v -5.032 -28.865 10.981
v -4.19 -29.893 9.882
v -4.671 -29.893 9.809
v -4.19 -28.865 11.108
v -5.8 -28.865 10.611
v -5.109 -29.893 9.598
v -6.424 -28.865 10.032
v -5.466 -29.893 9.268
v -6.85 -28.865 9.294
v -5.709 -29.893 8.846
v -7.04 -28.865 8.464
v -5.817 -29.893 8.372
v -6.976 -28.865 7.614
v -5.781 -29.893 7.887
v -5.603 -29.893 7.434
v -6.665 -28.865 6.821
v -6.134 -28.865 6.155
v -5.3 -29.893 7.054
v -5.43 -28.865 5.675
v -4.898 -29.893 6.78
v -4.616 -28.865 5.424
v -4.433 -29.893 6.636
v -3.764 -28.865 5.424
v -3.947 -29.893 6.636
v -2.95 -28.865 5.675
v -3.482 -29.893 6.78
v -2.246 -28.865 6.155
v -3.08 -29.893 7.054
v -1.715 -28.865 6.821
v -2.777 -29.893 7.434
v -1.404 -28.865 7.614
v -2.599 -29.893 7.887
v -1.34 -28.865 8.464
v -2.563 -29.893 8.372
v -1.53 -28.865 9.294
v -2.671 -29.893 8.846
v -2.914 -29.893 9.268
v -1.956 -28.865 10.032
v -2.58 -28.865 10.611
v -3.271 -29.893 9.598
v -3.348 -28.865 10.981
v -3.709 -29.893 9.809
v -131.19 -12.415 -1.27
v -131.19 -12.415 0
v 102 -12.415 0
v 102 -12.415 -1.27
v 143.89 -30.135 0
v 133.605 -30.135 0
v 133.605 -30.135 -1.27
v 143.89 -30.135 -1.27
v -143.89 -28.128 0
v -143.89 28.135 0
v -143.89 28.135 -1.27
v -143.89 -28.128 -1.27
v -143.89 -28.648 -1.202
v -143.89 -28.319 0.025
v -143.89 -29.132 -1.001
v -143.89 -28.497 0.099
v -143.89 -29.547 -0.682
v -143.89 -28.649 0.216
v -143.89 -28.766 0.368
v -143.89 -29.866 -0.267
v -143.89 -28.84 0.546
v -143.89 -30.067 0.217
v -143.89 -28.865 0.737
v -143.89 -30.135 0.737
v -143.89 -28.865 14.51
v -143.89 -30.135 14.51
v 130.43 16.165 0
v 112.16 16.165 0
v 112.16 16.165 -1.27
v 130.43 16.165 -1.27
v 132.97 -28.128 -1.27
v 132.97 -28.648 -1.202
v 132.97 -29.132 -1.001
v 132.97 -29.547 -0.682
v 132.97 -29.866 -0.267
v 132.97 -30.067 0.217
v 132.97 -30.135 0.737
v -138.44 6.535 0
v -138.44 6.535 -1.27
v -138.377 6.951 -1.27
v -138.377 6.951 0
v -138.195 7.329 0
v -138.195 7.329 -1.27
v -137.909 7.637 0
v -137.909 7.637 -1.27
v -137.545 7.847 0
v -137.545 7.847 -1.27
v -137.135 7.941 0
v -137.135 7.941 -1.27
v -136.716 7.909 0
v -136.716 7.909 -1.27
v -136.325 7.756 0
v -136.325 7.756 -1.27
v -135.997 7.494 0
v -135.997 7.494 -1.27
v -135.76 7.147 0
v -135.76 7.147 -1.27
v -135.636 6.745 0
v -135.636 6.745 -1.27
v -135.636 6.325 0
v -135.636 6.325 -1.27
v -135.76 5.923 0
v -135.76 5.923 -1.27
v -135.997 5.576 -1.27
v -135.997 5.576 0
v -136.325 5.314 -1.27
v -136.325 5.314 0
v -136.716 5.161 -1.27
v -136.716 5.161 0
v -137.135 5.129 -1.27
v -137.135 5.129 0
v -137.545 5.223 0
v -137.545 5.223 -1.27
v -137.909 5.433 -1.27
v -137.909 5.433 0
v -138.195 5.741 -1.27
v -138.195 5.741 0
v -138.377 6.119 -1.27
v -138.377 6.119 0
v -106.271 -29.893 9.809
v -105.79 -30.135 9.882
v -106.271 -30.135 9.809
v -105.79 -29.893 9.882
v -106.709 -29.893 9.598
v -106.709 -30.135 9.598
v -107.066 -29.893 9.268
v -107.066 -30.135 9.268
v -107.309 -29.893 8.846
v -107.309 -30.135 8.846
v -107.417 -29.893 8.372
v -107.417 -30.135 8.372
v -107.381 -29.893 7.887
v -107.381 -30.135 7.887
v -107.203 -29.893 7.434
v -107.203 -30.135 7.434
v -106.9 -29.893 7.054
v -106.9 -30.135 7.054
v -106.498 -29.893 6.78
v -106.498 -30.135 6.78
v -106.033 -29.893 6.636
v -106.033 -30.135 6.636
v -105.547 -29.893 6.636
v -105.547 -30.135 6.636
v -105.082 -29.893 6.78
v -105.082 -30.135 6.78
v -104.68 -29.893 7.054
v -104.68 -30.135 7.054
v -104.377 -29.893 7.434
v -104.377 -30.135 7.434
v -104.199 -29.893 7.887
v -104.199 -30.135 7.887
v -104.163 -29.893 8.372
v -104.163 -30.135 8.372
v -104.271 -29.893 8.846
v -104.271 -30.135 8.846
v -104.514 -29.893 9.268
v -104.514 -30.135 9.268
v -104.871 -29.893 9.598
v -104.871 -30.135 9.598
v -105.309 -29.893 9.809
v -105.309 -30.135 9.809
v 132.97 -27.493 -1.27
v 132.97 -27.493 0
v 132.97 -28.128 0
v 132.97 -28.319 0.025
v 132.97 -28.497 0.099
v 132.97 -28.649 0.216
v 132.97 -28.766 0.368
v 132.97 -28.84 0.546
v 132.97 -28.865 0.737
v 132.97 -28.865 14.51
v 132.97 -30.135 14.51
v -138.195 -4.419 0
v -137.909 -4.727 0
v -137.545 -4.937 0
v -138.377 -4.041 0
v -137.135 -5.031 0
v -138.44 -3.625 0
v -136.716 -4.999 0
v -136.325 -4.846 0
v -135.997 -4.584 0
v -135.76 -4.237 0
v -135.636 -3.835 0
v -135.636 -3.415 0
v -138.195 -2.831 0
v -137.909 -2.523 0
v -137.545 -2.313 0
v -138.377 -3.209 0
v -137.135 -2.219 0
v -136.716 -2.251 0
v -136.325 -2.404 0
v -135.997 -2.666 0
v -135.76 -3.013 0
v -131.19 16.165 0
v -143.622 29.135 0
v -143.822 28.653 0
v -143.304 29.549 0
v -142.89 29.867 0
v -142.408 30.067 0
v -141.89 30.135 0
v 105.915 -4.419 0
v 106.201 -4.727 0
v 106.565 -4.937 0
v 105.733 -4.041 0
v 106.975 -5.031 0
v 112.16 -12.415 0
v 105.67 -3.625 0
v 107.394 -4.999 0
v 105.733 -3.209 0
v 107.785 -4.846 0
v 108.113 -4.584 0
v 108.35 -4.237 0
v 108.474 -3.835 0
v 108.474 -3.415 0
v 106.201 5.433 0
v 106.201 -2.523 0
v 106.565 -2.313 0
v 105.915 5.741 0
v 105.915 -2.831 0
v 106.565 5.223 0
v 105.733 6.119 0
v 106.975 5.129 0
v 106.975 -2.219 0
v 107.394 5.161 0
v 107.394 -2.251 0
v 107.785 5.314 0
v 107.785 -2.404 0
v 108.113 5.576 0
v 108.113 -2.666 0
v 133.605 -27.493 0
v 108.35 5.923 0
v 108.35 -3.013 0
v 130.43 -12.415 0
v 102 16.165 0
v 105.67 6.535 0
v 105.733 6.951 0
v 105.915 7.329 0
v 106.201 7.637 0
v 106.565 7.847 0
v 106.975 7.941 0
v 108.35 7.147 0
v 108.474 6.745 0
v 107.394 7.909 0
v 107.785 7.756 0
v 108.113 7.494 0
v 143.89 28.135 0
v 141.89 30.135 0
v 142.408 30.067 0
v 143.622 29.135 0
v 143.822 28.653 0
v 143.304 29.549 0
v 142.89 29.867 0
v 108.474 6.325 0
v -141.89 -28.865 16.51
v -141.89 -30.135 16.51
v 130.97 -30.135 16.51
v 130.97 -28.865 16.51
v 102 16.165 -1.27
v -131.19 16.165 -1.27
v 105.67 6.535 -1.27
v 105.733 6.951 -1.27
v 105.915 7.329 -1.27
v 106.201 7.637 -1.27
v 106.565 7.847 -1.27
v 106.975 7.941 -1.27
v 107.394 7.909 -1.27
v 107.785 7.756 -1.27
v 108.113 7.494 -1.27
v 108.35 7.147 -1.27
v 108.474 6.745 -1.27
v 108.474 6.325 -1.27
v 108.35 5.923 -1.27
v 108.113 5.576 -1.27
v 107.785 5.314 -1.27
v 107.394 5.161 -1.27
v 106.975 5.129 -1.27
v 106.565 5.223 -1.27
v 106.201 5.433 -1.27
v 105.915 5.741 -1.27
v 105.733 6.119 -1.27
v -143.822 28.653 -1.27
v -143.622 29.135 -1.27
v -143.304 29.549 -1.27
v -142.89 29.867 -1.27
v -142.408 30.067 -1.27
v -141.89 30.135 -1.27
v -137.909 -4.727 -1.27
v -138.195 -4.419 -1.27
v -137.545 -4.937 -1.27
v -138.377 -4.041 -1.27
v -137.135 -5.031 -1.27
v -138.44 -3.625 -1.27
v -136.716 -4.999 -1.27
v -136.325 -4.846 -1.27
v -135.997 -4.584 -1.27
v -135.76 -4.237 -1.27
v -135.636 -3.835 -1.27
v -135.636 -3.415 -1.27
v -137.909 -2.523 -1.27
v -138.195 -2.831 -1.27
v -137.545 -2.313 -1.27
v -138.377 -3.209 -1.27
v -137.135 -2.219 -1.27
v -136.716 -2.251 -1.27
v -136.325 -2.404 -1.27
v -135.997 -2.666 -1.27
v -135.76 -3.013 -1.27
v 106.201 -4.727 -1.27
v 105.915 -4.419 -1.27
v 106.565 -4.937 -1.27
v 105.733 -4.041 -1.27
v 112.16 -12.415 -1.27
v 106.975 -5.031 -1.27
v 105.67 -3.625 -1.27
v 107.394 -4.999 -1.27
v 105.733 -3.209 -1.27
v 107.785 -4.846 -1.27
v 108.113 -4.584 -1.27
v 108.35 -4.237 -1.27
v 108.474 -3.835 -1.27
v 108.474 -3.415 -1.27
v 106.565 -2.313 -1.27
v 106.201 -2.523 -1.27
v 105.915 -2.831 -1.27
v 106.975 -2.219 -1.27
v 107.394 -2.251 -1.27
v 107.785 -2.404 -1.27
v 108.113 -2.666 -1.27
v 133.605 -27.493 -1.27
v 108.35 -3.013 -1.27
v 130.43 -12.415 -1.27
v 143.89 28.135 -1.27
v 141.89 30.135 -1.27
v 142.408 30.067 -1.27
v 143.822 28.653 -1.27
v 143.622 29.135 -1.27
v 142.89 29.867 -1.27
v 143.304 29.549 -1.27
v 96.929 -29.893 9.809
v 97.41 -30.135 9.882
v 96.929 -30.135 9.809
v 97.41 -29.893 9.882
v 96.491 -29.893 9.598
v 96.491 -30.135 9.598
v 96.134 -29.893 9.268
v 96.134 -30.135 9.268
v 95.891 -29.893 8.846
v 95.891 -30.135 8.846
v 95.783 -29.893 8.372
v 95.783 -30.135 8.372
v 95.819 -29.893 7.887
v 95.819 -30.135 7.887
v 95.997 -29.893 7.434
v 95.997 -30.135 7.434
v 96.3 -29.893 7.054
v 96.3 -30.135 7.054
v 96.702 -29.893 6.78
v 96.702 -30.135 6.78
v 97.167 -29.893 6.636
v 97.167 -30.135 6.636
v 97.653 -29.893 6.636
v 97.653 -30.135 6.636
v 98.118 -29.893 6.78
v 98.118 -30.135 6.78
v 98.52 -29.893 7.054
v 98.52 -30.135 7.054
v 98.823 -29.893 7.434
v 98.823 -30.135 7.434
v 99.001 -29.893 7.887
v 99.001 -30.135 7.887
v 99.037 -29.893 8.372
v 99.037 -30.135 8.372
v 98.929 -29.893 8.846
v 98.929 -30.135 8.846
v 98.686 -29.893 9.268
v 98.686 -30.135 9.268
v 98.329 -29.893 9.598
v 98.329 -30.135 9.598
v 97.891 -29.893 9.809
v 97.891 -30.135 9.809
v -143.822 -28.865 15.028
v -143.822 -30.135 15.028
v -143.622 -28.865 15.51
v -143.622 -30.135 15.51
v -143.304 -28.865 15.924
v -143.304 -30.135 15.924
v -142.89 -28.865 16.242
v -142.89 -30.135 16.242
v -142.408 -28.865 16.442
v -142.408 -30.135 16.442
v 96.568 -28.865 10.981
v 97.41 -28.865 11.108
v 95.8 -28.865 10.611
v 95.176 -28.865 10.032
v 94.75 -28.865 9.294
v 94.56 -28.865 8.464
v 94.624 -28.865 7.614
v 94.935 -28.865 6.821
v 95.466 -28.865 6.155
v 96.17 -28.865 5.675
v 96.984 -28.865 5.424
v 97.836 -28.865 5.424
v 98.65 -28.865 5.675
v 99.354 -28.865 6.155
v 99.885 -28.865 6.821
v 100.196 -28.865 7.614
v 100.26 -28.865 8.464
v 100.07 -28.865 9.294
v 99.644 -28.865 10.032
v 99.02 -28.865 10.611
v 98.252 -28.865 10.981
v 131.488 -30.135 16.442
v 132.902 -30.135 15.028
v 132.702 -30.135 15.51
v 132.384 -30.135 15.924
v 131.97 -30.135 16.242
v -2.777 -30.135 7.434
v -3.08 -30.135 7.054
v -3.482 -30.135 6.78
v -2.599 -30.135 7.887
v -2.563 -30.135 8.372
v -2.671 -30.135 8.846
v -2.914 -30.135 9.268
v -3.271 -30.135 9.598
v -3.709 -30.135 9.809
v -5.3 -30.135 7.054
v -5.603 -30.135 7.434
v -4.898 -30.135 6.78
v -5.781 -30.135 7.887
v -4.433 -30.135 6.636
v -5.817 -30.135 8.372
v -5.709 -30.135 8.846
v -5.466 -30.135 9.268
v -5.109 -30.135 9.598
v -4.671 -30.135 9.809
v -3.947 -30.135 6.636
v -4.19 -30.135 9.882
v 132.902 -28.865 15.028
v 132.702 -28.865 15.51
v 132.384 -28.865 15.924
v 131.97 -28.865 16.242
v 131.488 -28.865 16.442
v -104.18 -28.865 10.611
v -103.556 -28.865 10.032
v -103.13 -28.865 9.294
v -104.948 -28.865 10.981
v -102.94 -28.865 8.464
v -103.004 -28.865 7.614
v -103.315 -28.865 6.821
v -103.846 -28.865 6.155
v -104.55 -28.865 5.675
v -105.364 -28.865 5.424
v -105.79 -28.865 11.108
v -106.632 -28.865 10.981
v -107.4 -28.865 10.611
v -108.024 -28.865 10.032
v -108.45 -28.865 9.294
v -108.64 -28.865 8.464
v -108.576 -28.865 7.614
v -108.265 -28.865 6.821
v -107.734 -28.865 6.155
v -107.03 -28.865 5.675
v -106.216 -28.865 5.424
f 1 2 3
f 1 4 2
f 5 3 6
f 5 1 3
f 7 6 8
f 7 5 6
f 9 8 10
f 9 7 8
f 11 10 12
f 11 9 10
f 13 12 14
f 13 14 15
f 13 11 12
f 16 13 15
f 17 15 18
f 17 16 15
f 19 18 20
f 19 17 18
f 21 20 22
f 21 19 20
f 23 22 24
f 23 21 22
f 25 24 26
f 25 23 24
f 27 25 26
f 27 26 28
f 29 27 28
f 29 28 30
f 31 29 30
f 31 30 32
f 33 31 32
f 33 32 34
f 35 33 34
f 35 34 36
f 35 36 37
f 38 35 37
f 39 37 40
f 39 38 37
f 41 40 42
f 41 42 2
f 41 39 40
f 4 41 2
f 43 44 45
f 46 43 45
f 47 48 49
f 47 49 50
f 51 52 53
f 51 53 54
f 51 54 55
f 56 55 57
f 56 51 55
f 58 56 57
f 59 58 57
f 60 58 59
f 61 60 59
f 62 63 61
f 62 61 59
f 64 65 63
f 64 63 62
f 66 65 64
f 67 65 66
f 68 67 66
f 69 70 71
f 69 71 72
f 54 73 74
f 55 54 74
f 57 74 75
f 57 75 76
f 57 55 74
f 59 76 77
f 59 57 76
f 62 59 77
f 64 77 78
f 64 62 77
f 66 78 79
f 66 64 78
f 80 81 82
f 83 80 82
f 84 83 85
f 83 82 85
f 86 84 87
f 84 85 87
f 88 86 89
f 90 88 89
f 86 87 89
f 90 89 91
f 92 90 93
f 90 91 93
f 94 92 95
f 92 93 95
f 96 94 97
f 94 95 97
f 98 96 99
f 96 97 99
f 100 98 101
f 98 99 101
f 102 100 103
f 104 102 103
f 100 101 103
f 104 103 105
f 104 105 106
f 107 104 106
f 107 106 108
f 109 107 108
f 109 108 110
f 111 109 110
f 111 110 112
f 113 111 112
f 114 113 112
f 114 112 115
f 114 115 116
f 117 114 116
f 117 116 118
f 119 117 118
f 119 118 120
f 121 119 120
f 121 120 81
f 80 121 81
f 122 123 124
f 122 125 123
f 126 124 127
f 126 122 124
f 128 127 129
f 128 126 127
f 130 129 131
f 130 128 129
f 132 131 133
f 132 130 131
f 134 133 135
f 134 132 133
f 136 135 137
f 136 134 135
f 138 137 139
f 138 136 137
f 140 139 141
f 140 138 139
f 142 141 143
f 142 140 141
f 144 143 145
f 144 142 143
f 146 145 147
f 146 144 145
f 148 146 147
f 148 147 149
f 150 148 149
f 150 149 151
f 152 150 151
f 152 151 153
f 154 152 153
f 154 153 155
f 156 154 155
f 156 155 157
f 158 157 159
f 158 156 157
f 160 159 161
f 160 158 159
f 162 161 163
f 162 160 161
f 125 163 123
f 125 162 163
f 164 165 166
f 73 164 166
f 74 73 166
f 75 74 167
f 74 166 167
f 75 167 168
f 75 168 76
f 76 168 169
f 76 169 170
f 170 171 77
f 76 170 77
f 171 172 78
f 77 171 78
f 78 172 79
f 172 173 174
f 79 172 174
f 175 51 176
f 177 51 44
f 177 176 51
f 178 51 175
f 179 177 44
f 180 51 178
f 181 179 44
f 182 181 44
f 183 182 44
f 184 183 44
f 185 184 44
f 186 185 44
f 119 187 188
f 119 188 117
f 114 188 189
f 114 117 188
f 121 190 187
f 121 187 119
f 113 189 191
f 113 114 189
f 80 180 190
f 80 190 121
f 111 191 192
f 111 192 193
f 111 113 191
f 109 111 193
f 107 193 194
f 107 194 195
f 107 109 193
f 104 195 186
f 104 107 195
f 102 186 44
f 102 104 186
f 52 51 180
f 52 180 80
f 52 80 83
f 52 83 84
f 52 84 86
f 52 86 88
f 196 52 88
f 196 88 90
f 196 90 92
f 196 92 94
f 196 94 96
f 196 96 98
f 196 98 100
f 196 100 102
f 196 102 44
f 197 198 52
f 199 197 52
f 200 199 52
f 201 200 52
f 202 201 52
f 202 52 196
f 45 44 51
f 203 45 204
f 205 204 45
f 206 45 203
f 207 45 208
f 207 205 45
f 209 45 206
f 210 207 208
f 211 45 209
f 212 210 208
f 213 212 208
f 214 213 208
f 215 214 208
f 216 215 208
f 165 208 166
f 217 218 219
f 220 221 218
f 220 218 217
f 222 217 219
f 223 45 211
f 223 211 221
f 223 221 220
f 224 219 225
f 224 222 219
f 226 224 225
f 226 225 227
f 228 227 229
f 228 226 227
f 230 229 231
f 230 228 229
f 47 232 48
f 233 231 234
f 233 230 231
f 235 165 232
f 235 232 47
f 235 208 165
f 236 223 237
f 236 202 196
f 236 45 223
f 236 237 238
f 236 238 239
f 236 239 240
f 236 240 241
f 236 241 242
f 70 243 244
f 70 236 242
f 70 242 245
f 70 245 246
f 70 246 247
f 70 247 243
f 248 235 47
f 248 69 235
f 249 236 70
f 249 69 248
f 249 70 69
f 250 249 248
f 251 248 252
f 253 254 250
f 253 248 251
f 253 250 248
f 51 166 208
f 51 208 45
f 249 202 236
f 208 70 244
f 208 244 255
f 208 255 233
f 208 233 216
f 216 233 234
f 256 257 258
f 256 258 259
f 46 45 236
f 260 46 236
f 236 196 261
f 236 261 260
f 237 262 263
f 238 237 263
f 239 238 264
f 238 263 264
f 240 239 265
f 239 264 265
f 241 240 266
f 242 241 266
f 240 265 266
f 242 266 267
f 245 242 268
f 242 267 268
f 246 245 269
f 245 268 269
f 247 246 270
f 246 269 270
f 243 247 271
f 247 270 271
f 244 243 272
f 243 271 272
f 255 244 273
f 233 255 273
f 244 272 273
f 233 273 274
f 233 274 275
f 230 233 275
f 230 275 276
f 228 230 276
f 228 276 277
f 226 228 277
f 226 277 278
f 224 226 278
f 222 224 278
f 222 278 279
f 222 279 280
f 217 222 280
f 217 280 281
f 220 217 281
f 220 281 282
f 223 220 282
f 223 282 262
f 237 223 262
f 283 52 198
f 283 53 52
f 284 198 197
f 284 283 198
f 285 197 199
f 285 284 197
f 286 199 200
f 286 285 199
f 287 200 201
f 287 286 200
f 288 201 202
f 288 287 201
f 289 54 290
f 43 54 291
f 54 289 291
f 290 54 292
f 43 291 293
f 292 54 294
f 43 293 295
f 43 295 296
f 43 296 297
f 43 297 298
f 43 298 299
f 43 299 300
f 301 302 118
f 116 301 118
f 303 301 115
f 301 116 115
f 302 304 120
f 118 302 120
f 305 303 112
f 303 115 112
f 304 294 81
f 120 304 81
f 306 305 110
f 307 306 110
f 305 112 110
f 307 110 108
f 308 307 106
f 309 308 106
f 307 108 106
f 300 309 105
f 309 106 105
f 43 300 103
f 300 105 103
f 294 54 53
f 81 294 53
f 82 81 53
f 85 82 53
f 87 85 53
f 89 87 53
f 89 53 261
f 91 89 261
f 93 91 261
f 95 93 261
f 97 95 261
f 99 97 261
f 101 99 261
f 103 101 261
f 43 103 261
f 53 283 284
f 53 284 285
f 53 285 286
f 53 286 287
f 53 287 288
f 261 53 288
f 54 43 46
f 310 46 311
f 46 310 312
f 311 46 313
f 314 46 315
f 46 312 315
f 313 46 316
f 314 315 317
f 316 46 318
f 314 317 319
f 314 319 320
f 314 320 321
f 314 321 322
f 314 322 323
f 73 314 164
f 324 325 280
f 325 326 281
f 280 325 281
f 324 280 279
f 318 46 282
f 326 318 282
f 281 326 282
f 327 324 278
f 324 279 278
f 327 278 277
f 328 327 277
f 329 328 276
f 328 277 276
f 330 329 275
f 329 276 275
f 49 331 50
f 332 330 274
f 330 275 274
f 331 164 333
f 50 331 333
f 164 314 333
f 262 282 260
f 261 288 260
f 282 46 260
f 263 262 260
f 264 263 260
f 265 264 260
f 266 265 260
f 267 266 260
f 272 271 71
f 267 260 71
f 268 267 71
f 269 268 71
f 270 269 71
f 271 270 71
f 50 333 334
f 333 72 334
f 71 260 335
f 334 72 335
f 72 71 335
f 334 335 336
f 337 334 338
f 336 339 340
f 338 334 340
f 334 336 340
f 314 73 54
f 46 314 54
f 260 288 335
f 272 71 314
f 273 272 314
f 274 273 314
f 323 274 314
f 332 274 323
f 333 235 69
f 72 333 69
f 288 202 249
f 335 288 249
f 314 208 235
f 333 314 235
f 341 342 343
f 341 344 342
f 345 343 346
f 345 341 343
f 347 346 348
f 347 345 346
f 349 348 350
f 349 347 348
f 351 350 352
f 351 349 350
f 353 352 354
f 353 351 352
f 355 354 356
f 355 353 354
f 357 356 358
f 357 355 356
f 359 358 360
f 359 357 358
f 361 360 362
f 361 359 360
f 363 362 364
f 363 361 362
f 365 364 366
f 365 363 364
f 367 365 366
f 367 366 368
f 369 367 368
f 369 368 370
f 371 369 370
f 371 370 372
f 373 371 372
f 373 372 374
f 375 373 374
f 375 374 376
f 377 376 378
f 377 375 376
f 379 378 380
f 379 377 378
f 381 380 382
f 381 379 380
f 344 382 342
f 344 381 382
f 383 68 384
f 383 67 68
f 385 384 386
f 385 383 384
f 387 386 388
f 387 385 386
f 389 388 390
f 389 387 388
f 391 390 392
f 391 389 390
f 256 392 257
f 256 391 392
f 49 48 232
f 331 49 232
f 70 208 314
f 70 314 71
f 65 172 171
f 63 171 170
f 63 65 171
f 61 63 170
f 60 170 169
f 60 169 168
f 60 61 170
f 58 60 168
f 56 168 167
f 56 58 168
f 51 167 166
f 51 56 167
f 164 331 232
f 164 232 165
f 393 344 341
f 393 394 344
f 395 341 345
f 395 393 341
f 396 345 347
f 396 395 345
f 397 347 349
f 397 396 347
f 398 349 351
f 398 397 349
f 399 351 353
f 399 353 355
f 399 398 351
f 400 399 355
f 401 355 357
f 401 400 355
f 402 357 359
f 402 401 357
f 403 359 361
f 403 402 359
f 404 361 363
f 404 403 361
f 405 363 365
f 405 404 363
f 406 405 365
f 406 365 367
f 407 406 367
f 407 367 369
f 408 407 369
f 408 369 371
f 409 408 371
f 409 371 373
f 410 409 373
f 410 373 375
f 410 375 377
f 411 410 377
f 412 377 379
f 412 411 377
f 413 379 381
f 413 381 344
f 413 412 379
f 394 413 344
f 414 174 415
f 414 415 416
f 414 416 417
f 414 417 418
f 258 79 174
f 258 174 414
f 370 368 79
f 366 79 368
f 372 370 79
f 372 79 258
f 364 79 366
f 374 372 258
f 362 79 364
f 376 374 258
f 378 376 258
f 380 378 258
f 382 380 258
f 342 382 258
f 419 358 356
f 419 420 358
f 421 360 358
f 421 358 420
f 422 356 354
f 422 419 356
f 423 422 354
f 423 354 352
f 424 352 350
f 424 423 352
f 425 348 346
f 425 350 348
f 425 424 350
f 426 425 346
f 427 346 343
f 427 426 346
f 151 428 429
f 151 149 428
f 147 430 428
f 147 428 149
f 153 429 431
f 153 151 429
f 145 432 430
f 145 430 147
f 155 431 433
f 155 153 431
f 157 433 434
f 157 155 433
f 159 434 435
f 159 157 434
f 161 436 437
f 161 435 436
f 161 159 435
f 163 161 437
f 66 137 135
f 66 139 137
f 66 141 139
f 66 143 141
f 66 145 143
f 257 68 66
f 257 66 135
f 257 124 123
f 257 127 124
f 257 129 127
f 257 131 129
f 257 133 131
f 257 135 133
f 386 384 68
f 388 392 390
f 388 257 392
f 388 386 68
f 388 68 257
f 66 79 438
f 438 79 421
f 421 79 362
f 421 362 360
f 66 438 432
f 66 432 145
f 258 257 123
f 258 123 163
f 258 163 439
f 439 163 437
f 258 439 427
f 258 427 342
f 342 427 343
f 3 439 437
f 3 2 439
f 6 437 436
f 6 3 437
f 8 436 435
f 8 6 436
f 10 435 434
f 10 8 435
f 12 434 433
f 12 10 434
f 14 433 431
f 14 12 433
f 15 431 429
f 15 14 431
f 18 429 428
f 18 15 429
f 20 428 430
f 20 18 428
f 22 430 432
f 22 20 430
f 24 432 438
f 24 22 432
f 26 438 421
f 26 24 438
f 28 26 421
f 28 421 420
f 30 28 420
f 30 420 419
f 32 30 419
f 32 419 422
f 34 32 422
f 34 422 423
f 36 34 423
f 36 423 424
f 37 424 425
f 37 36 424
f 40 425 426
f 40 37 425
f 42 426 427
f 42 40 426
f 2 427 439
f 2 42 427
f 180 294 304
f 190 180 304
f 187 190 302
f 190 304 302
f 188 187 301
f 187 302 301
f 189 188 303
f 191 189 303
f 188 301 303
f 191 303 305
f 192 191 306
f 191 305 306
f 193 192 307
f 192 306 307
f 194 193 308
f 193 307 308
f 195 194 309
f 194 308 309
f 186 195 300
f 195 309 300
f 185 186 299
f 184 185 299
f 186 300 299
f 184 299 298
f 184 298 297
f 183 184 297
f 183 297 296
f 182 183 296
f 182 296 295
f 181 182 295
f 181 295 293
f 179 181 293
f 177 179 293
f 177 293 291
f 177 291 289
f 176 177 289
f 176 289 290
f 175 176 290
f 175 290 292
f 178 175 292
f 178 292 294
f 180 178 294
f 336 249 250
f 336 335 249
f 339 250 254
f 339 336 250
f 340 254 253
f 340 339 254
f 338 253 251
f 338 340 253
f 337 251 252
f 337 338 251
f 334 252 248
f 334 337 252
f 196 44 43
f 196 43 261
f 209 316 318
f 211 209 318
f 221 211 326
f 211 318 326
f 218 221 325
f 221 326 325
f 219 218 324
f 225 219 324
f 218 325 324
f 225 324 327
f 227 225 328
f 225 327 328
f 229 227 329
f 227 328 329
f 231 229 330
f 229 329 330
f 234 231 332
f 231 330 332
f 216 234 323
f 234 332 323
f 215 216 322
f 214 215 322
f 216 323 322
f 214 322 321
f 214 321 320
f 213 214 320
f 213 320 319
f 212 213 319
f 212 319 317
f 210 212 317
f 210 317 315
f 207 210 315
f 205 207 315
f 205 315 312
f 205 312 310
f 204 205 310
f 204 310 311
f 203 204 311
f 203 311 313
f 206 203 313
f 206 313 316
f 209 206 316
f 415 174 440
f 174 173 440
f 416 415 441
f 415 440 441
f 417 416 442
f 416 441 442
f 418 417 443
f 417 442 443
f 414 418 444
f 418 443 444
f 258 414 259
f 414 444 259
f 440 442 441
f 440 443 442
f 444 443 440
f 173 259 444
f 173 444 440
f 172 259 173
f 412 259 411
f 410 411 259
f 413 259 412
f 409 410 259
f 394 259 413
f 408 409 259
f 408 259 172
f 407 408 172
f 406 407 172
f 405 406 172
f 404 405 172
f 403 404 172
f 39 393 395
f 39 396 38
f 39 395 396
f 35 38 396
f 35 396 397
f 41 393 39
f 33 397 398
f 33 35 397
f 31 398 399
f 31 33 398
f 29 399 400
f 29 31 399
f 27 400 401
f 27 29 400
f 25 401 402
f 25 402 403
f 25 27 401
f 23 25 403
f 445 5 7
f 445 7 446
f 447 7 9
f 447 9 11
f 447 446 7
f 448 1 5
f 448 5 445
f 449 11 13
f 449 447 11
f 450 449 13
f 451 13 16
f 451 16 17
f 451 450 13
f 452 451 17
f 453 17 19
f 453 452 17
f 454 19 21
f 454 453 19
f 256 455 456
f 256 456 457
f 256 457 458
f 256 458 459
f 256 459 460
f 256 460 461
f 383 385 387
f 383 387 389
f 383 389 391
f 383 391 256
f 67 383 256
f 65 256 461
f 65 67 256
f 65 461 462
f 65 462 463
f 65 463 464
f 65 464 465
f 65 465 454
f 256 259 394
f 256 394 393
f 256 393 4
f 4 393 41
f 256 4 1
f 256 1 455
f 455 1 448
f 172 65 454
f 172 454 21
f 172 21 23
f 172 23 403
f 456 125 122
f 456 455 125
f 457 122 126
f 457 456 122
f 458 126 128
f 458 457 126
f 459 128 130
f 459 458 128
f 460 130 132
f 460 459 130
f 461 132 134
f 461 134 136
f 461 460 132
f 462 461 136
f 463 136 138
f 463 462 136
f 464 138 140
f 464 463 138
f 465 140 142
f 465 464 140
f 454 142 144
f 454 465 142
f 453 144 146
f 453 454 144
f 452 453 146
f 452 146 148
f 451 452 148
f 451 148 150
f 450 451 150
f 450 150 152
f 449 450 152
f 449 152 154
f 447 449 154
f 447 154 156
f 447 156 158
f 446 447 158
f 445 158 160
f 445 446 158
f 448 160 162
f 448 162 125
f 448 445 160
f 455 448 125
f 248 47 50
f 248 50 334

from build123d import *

# Parameters (mm, degrees)
SKETCH2_W                     = 287.78
SKETCH2_H                     = 60.27
SKETCH2_W_2                   = 233.19
SKETCH2_H_2                   = 28.58
SKETCH2_W_3                   = 18.27
BASE_FLANGE1_DEPTH            = 1.27
EDGE_FLANGE1_STRIP_W          = 6.5532
EDGE_FLANGE1_STRIP_H          = 1.27
EDGE_FLANGE1_STRIP_CUT_DEPTH  = 276.86
EDGE_FLANGE1_RELIEF_W         = 7.1882
EDGE_FLANGE1_RELIEF_H         = 0.635
EDGE_FLANGE1_RELIEF_CUT_DEPTH = 1.27
EDGE_FLANGE1_DEPTH            = 276.86
F_34_0_111_DIAMETER_HOLE1_D   = 2.8194
LPATTERN1_COUNT               = 3
LPATTERN1_PITCH               = 101.6
FILLET1_R                     = 2


# Sheet-metal steps are written as plain solids
with BuildPart() as part:
    # Sketch2 → Base-Flange1 (new body)
    with BuildSketch(Plane.XY):
        Rectangle(SKETCH2_W, SKETCH2_H)
        with Locations((-14.595, 1.875)):
            Rectangle(SKETCH2_W_2, SKETCH2_H_2, mode=Mode.SUBTRACT)
        with Locations((121.295, 1.875)):
            Rectangle(SKETCH2_W_3, SKETCH2_H_2, mode=Mode.SUBTRACT)
    extrude(amount=-BASE_FLANGE1_DEPTH)

    # Edge-Flange1 strip (across the edge) → Edge-Flange1 strip cut (cut)
    with BuildSketch(Plane(origin=(-143.89, -30.135, 0), x_dir=(0, 1, 0), z_dir=(1, 0, 0))):
        with Locations((-1.27, -0.635)):
            Rectangle(EDGE_FLANGE1_STRIP_W, EDGE_FLANGE1_STRIP_H)
    extrude(amount=EDGE_FLANGE1_STRIP_CUT_DEPTH, mode=Mode.SUBTRACT)

    # Edge-Flange1 relief (on the sheet) → Edge-Flange1 relief cut (cut)
    with BuildSketch(Plane(origin=(-143.89, -28.1284, 0), x_dir=(0, 1, 0), z_dir=(0, 0, 1))):
        with Locations((-2.9591, -277.1775)):
            Rectangle(EDGE_FLANGE1_RELIEF_W, EDGE_FLANGE1_RELIEF_H)
    extrude(amount=-EDGE_FLANGE1_RELIEF_CUT_DEPTH, mode=Mode.SUBTRACT)

    # Edge-Flange1 section (across the edge) → Edge-Flange1 (add)
    with BuildSketch(Plane(origin=(-143.89, -30.135, 0), x_dir=(0, 1, 0), z_dir=(1, 0, 0))):
        with BuildLine():
            Line((0, 0.7366), (0, 16.51))
            Line((0, 16.51), (1.27, 16.51))
            Line((1.27, 16.51), (1.27, 0.7366))
            ThreePointArc((1.27, 0.7366), (1.485745145, 0.215745145), (2.0066, 0))
            Line((2.0066, 0), (2.0066, -1.27))
            ThreePointArc((2.0066, -1.27), (0.587719533, -0.682280467), (0, 0.7366))
        make_face()
    extrude(amount=EDGE_FLANGE1_DEPTH)

    # #34 (0.111) Diameter Hole1 (through all)
    with Locations(Plane.XY):
        with Locations((-137.03, 6.535), (-137.03, -3.625), (107.08, 6.535), (107.08, -3.625)):
            Hole(F_34_0_111_DIAMETER_HOLE1_D / 2)

    # Sketch13 → CSK for #4 Flat Head Machine Screw (100)1 (revolve, cut)
    with BuildSketch(Plane(origin=(97.41, -28.865, 8.25), x_dir=(0, 0, 1), z_dir=(1, 0, 0))):
        Polygon((0, 0), (0, 1.27), (1.63195, 1.27), (1.63195, 1.028358553), (2.8575, 0), align=None)
    csk_for_4_flat_head_machine_screw_100 = revolve(axis=Axis((97.41, -22.515, 8.25), (0, -1, 0)), mode=Mode.SUBTRACT)

    # LPattern1: CSK for #4 Flat Head Machine Screw (100)1 ×3
    with Locations(*[(-i * LPATTERN1_PITCH, 0, 0) for i in range(1, LPATTERN1_COUNT)]):
        add(csk_for_4_flat_head_machine_screw_100, mode=Mode.SUBTRACT)

    # Fillet1
    fillet1_edges = [part.edges().sort_by_distance(p)[0] for p in [
        (-143.89, -29.5, 16.51),
        (132.97, -29.5, 16.51),
        (-143.89, 30.135, -0.635),
        (143.89, 30.135, -0.635),
    ]]
    fillet(fillet1_edges, radius=FILLET1_R)


solid = part.part
